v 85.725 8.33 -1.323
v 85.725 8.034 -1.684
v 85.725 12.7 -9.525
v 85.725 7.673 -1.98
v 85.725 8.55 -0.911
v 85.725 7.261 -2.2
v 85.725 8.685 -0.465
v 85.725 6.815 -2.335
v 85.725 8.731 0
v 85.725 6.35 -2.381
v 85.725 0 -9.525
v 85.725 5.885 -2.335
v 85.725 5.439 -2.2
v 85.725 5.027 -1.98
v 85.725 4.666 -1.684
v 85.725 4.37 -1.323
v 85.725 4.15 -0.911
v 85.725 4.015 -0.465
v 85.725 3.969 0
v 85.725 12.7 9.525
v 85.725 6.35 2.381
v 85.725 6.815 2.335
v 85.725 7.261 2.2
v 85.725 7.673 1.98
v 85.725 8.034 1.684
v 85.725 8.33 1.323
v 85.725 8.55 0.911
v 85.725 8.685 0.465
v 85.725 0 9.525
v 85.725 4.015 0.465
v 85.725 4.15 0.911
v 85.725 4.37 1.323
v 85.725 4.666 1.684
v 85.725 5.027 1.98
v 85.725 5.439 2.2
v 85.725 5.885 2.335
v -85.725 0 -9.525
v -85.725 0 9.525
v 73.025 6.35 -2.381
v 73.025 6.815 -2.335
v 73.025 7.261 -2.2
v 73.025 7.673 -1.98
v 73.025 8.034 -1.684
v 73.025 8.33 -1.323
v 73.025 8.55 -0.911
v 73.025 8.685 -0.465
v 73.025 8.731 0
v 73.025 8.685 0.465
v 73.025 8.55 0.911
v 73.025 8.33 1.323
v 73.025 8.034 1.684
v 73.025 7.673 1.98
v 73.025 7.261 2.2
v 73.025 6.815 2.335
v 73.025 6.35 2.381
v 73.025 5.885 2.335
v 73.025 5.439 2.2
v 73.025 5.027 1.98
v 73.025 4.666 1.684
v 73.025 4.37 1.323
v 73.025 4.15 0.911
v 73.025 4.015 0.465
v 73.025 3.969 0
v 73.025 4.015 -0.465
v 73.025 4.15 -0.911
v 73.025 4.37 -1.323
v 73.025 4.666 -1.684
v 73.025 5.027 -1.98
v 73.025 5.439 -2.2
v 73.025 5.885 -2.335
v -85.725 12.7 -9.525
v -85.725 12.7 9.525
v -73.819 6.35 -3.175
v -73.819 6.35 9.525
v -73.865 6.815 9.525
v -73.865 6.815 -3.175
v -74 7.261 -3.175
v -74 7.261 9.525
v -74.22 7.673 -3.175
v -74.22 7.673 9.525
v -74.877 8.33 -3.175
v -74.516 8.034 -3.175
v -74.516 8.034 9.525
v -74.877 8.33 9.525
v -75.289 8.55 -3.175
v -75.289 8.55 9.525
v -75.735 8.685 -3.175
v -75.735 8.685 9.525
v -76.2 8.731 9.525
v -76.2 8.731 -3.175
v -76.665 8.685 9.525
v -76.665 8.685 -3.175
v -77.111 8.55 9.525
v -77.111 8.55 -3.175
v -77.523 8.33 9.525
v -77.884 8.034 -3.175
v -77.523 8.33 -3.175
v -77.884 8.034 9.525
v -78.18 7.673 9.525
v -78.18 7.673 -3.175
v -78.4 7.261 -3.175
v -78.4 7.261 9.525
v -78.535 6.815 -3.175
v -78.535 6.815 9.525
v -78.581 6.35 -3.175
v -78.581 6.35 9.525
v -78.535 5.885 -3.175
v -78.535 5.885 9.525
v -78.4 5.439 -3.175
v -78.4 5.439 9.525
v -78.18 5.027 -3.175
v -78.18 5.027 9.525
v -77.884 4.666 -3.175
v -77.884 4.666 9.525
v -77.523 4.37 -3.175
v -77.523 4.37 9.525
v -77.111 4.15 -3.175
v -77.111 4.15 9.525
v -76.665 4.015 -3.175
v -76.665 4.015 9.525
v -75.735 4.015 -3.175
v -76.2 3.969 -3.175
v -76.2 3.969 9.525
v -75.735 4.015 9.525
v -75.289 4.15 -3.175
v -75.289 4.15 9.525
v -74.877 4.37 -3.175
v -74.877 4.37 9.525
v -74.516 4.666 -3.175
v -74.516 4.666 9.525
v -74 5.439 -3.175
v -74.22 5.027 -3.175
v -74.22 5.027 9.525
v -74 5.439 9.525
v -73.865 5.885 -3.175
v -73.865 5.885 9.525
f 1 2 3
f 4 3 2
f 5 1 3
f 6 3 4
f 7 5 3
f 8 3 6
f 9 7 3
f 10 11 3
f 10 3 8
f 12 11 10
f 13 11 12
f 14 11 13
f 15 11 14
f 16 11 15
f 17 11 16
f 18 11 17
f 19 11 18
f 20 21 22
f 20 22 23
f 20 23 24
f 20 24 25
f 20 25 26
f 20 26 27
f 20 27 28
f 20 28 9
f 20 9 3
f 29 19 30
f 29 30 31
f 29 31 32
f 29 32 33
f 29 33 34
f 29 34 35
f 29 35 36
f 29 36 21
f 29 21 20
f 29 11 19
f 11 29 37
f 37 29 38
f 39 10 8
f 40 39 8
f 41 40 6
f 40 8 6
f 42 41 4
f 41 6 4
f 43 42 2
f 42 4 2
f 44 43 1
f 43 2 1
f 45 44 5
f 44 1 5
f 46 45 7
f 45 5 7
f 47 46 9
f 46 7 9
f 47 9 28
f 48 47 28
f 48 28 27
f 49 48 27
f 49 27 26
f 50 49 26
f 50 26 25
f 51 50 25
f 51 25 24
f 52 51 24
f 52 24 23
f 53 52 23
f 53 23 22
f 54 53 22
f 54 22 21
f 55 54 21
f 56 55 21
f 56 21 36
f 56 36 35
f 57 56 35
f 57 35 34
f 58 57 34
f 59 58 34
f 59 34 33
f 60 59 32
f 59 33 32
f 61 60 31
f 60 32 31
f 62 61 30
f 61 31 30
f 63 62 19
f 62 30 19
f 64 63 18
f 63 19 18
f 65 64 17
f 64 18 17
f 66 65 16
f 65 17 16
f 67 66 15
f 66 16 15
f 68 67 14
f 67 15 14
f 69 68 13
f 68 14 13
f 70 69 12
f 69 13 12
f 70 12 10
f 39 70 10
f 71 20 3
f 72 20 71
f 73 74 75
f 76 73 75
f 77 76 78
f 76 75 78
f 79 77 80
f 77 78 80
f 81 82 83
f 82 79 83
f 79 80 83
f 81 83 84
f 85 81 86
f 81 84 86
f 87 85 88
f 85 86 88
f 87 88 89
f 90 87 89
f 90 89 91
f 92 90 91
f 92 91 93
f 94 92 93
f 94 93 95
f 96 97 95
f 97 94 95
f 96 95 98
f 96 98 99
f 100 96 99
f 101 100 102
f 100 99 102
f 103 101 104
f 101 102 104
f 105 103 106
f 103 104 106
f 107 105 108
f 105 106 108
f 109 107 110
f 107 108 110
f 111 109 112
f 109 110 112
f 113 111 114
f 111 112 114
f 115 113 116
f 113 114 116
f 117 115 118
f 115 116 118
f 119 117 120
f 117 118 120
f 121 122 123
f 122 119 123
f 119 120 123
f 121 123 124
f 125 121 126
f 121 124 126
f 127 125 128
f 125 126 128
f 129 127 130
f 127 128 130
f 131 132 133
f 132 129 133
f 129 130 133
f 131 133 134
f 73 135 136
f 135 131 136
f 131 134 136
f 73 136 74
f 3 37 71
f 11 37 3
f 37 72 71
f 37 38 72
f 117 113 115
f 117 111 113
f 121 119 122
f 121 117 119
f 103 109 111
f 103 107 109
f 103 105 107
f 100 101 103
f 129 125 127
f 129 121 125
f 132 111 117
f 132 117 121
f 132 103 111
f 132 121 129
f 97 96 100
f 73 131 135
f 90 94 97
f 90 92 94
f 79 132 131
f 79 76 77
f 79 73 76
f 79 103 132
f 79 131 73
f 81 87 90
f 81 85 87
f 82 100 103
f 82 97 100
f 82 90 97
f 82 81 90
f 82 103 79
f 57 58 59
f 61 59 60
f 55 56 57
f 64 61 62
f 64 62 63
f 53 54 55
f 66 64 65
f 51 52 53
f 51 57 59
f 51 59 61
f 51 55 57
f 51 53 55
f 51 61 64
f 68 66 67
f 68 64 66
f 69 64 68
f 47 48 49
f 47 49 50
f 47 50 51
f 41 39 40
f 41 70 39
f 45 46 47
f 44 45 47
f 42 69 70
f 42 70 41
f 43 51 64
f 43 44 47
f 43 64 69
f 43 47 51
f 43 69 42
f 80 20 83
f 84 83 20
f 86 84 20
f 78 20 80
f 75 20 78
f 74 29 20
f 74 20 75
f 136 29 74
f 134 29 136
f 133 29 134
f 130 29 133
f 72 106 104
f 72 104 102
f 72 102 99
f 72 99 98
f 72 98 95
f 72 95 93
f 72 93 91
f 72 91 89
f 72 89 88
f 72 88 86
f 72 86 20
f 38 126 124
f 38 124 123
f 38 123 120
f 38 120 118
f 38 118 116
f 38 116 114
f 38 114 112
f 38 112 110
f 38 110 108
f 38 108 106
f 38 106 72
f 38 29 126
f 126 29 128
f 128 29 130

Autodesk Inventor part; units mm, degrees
ref_plane "YZ Plane" through (0, 0, 0) normal (1, 0, 0) x (0, 1, 0)
ref_plane "XZ Plane" through (0, 0, 0) normal (0, 1, 0) x (-1, 0, 0)
ref_plane "XY Plane" through (0, 0, 0) normal (0, 0, 1) x (1, 0, 0)
sketch "Sketch1" plane through (0, 0, 0) normal (0, 1, 0) x (-1, 0, 0)
  line L0 (-85.725, 9.525) -> (85.725, 9.525)
  line L1 (85.725, 9.525) -> (85.725, -9.525)
  line L2 (85.725, -9.525) -> (-85.725, -9.525)
  line L3 (-85.725, -9.525) -> (-85.725, 9.525)
  line L4 (-85.725, 9.525) -> (85.725, -9.525) construction
  line L5 (85.725, 9.525) -> (-85.725, -9.525) construction
  point P0 (0, 0)
  dimension "d0" = 171.45
  dimension "d1" = 19.05
extrude "Extrusion1" add sketch "Sketch1" along normal blind 12.7
sketch "Sketch2" plane through (85.725, 0, 9.525) normal (1, 0, 0) x (0, 0, -1)
  line L0 (0, 0) -> (0, 12.7) projected
  line L1 (0, 6.35) -> (19.05, 6.35)
  line L2 (19.05, 0) -> (19.05, 12.7) projected
  circle A0 centre (9.525, 6.35) radius 2.3812
  point P0 (9.525, 0)
  dimension "d4" = 4.7625
extrude "Extrusion2" cut sketch "Sketch2" against normal blind 12.7
sketch "Sketch3" plane through (-85.725, 0, 9.525) normal (0, 0, 1) x (1, 0, 0)
  line L0 (0, 0) -> (0, 12.7) projected
  line L1 (0, 6.35) -> (9.525, 6.35)
  circle A0 centre (9.525, 6.35) radius 2.3812
  point P0 (85.725, 0)
  dimension "d7" = 9.525
  dimension "d8" = 4.7625
extrude "Extrusion3" cut sketch "Sketch3" against normal blind 12.7
properties part number "shootFrame" material "Wood (Birch)"
